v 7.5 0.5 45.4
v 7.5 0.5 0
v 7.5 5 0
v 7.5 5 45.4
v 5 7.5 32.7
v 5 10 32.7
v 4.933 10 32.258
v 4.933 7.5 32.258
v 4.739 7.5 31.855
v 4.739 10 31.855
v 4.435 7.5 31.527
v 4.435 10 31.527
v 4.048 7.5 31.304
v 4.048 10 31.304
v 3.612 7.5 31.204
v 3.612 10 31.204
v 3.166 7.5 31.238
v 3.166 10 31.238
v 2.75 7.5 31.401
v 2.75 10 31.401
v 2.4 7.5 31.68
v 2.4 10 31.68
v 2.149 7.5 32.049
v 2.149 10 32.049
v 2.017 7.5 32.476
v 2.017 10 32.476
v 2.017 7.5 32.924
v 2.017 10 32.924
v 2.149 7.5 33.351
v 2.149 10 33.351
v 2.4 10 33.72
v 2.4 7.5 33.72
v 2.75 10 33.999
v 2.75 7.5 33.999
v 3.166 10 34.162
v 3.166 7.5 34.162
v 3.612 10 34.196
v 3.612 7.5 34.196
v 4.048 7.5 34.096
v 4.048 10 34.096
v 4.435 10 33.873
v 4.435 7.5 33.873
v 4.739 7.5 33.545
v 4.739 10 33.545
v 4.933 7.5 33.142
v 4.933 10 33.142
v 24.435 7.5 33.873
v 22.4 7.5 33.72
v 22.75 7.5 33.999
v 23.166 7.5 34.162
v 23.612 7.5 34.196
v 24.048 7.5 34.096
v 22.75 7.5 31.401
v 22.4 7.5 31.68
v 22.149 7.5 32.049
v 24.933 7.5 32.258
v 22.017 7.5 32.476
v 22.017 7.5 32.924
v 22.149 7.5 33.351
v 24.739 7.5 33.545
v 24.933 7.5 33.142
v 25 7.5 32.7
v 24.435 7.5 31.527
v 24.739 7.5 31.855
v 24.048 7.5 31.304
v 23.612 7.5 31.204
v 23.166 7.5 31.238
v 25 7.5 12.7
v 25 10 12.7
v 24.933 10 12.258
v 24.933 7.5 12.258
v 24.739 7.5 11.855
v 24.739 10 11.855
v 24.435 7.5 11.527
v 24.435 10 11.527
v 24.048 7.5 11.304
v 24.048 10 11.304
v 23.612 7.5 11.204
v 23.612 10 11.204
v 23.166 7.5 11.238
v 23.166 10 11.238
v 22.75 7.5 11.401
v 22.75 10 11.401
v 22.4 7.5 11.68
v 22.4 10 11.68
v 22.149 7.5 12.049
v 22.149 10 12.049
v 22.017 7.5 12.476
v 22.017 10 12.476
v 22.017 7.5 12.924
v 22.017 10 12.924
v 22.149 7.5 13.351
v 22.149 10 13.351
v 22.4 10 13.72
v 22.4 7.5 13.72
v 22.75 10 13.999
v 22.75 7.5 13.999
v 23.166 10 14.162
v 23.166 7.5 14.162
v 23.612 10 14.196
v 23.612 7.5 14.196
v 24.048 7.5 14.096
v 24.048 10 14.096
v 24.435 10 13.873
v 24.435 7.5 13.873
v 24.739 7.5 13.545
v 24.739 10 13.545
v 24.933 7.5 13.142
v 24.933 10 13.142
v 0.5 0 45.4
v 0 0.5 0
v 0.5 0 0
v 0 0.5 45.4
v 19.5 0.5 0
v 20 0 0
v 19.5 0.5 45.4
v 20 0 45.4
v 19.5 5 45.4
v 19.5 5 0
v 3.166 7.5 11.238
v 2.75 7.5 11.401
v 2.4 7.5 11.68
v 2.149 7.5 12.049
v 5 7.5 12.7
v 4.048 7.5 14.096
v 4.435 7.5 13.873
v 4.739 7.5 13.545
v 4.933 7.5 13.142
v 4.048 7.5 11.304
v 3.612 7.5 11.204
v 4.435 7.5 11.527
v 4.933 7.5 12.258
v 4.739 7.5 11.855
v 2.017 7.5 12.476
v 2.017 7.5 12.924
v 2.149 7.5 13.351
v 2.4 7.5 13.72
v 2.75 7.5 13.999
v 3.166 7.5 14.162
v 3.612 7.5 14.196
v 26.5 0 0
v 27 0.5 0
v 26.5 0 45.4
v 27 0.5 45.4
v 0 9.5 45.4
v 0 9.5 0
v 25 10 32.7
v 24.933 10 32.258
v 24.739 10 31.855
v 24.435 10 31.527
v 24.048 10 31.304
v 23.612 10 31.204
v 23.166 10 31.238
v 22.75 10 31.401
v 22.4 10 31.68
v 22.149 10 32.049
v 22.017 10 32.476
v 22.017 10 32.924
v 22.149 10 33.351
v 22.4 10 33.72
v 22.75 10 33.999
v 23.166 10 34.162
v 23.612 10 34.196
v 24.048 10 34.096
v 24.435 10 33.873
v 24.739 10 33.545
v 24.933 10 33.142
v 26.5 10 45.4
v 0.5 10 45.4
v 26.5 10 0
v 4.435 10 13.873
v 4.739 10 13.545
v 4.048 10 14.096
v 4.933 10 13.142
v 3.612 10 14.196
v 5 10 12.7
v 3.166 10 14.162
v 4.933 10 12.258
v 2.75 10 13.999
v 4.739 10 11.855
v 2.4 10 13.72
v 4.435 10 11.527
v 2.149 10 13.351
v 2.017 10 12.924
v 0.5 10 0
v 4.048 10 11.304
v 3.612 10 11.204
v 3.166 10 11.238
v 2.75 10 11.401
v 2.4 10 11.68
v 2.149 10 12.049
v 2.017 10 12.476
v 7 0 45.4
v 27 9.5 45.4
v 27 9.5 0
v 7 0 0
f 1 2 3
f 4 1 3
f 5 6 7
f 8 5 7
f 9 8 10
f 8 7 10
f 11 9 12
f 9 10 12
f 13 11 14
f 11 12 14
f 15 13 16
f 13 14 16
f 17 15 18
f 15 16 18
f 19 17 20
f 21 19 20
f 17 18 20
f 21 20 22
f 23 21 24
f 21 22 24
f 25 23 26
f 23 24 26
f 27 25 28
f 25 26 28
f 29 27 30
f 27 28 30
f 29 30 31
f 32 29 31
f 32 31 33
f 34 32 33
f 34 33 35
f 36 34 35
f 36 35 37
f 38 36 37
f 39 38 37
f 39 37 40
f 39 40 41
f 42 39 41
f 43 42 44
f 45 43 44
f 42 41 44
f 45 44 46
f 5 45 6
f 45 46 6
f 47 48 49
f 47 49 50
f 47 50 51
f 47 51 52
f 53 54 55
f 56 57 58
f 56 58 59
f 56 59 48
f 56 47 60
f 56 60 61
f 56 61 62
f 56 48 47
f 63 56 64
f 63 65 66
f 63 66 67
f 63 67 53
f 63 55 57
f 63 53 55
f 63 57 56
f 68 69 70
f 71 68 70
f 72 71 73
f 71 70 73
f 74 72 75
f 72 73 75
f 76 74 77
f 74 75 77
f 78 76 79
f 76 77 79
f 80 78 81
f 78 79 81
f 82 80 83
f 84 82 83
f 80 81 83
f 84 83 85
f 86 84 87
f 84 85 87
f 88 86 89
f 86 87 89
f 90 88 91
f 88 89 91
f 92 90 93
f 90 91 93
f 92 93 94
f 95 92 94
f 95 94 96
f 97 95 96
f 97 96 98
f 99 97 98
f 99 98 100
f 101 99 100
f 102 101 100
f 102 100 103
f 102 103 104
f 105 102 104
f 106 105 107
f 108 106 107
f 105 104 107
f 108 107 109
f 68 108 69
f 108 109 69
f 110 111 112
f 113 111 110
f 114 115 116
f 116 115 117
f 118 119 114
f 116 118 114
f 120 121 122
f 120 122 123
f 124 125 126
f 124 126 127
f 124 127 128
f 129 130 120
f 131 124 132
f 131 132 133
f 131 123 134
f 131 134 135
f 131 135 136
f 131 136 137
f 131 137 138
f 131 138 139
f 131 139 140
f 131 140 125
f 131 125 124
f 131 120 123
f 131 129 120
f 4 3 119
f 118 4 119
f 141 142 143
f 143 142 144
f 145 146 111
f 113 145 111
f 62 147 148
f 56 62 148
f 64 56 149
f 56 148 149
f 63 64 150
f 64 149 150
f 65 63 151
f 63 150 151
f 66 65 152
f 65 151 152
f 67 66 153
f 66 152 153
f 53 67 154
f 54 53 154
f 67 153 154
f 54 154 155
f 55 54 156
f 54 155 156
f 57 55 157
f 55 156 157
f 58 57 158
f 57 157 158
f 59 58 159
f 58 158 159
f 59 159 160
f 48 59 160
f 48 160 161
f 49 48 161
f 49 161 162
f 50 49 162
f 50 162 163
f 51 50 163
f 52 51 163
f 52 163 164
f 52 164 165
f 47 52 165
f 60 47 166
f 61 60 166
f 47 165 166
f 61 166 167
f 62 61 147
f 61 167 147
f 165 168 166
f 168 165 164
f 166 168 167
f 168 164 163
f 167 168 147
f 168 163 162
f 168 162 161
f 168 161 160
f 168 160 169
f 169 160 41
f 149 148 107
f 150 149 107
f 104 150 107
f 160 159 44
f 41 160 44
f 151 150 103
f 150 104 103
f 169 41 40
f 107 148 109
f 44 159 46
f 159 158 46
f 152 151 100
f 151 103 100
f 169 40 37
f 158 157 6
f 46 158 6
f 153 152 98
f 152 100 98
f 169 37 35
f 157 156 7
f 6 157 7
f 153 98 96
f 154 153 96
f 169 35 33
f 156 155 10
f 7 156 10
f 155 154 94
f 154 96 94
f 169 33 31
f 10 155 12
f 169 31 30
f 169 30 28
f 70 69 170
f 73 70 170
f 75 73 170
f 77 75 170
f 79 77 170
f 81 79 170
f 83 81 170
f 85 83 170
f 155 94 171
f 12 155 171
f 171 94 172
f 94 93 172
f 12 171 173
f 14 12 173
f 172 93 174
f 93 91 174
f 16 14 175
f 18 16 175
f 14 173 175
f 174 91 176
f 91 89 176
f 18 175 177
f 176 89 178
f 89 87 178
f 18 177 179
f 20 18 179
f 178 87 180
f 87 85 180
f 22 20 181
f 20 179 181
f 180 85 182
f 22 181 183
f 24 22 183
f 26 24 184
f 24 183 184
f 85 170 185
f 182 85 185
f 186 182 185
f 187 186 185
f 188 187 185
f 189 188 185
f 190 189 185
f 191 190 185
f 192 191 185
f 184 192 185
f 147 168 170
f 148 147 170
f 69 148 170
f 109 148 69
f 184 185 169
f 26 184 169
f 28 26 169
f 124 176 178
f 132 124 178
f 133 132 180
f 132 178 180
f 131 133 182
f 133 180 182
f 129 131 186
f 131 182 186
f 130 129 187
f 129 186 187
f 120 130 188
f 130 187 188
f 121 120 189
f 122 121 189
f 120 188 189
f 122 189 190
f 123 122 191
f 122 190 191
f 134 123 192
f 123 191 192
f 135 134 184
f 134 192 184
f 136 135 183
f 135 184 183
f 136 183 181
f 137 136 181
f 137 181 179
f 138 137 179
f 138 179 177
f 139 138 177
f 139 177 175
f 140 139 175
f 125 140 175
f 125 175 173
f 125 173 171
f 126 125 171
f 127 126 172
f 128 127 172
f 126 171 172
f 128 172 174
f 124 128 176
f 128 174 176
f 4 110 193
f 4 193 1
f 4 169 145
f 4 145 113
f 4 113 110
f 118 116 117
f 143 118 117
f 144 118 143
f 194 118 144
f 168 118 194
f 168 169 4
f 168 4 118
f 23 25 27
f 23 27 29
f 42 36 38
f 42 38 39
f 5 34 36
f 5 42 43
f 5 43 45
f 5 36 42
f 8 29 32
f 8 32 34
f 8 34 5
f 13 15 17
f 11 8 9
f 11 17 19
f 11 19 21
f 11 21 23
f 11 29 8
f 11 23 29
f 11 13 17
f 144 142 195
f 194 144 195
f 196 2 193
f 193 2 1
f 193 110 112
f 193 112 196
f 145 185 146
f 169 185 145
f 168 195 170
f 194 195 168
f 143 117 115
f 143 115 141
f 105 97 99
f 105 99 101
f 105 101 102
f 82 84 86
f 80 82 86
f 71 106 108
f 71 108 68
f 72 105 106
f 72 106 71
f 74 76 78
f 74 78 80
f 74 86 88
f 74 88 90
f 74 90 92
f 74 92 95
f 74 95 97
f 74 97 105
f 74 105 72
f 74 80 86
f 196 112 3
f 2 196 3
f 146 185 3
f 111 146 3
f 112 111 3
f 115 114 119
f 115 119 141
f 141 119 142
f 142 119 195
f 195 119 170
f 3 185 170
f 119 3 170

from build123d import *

# Parameters (mm, degrees)
EXTRUDE_1_DEPTH     = 45.4
SKETCH_2_R          = 1.5
CUT_EXTRUDE_1_DEPTH = 2.5
CHAMFER_1_SIZE      = 0.5


with BuildPart() as part:
    # 草图1 → 凸台-拉伸1 (new body)
    with BuildSketch(Plane.XY):
        Polygon((0, 0), (7.5, 0), (7.5, 5), (19.5, 5), (19.5, 0), (27, 0), (27, 10), (0, 10), align=None)
    extrude(amount=EXTRUDE_1_DEPTH)

    # 草图2 → 切除-拉伸1 (cut)
    with BuildSketch(Plane(origin=(0, 10, 0), x_dir=(1, 0, 0), z_dir=(0, 1, 0))):
        with Locations((23.5, -12.7)):
            Circle(SKETCH_2_R)
        with Locations((3.5, -12.7)):
            Circle(SKETCH_2_R)
        with Locations((23.5, -32.7)):
            Circle(SKETCH_2_R)
        with Locations((3.5, -32.7)):
            Circle(SKETCH_2_R)
    extrude(amount=-CUT_EXTRUDE_1_DEPTH, mode=Mode.SUBTRACT)

    # 倒角1
    chamfer_1_edges = [part.edges().sort_by_distance(p)[0] for p in [
        (0, 10, 22.7),
        (27, 10, 22.7),
        (27, 0, 22.7),
        (19.5, 0, 22.7),
        (7.5, 0, 22.7),
        (0, 0, 22.7),
    ]]
    chamfer(chamfer_1_edges, length=CHAMFER_1_SIZE)


solid = part.part
